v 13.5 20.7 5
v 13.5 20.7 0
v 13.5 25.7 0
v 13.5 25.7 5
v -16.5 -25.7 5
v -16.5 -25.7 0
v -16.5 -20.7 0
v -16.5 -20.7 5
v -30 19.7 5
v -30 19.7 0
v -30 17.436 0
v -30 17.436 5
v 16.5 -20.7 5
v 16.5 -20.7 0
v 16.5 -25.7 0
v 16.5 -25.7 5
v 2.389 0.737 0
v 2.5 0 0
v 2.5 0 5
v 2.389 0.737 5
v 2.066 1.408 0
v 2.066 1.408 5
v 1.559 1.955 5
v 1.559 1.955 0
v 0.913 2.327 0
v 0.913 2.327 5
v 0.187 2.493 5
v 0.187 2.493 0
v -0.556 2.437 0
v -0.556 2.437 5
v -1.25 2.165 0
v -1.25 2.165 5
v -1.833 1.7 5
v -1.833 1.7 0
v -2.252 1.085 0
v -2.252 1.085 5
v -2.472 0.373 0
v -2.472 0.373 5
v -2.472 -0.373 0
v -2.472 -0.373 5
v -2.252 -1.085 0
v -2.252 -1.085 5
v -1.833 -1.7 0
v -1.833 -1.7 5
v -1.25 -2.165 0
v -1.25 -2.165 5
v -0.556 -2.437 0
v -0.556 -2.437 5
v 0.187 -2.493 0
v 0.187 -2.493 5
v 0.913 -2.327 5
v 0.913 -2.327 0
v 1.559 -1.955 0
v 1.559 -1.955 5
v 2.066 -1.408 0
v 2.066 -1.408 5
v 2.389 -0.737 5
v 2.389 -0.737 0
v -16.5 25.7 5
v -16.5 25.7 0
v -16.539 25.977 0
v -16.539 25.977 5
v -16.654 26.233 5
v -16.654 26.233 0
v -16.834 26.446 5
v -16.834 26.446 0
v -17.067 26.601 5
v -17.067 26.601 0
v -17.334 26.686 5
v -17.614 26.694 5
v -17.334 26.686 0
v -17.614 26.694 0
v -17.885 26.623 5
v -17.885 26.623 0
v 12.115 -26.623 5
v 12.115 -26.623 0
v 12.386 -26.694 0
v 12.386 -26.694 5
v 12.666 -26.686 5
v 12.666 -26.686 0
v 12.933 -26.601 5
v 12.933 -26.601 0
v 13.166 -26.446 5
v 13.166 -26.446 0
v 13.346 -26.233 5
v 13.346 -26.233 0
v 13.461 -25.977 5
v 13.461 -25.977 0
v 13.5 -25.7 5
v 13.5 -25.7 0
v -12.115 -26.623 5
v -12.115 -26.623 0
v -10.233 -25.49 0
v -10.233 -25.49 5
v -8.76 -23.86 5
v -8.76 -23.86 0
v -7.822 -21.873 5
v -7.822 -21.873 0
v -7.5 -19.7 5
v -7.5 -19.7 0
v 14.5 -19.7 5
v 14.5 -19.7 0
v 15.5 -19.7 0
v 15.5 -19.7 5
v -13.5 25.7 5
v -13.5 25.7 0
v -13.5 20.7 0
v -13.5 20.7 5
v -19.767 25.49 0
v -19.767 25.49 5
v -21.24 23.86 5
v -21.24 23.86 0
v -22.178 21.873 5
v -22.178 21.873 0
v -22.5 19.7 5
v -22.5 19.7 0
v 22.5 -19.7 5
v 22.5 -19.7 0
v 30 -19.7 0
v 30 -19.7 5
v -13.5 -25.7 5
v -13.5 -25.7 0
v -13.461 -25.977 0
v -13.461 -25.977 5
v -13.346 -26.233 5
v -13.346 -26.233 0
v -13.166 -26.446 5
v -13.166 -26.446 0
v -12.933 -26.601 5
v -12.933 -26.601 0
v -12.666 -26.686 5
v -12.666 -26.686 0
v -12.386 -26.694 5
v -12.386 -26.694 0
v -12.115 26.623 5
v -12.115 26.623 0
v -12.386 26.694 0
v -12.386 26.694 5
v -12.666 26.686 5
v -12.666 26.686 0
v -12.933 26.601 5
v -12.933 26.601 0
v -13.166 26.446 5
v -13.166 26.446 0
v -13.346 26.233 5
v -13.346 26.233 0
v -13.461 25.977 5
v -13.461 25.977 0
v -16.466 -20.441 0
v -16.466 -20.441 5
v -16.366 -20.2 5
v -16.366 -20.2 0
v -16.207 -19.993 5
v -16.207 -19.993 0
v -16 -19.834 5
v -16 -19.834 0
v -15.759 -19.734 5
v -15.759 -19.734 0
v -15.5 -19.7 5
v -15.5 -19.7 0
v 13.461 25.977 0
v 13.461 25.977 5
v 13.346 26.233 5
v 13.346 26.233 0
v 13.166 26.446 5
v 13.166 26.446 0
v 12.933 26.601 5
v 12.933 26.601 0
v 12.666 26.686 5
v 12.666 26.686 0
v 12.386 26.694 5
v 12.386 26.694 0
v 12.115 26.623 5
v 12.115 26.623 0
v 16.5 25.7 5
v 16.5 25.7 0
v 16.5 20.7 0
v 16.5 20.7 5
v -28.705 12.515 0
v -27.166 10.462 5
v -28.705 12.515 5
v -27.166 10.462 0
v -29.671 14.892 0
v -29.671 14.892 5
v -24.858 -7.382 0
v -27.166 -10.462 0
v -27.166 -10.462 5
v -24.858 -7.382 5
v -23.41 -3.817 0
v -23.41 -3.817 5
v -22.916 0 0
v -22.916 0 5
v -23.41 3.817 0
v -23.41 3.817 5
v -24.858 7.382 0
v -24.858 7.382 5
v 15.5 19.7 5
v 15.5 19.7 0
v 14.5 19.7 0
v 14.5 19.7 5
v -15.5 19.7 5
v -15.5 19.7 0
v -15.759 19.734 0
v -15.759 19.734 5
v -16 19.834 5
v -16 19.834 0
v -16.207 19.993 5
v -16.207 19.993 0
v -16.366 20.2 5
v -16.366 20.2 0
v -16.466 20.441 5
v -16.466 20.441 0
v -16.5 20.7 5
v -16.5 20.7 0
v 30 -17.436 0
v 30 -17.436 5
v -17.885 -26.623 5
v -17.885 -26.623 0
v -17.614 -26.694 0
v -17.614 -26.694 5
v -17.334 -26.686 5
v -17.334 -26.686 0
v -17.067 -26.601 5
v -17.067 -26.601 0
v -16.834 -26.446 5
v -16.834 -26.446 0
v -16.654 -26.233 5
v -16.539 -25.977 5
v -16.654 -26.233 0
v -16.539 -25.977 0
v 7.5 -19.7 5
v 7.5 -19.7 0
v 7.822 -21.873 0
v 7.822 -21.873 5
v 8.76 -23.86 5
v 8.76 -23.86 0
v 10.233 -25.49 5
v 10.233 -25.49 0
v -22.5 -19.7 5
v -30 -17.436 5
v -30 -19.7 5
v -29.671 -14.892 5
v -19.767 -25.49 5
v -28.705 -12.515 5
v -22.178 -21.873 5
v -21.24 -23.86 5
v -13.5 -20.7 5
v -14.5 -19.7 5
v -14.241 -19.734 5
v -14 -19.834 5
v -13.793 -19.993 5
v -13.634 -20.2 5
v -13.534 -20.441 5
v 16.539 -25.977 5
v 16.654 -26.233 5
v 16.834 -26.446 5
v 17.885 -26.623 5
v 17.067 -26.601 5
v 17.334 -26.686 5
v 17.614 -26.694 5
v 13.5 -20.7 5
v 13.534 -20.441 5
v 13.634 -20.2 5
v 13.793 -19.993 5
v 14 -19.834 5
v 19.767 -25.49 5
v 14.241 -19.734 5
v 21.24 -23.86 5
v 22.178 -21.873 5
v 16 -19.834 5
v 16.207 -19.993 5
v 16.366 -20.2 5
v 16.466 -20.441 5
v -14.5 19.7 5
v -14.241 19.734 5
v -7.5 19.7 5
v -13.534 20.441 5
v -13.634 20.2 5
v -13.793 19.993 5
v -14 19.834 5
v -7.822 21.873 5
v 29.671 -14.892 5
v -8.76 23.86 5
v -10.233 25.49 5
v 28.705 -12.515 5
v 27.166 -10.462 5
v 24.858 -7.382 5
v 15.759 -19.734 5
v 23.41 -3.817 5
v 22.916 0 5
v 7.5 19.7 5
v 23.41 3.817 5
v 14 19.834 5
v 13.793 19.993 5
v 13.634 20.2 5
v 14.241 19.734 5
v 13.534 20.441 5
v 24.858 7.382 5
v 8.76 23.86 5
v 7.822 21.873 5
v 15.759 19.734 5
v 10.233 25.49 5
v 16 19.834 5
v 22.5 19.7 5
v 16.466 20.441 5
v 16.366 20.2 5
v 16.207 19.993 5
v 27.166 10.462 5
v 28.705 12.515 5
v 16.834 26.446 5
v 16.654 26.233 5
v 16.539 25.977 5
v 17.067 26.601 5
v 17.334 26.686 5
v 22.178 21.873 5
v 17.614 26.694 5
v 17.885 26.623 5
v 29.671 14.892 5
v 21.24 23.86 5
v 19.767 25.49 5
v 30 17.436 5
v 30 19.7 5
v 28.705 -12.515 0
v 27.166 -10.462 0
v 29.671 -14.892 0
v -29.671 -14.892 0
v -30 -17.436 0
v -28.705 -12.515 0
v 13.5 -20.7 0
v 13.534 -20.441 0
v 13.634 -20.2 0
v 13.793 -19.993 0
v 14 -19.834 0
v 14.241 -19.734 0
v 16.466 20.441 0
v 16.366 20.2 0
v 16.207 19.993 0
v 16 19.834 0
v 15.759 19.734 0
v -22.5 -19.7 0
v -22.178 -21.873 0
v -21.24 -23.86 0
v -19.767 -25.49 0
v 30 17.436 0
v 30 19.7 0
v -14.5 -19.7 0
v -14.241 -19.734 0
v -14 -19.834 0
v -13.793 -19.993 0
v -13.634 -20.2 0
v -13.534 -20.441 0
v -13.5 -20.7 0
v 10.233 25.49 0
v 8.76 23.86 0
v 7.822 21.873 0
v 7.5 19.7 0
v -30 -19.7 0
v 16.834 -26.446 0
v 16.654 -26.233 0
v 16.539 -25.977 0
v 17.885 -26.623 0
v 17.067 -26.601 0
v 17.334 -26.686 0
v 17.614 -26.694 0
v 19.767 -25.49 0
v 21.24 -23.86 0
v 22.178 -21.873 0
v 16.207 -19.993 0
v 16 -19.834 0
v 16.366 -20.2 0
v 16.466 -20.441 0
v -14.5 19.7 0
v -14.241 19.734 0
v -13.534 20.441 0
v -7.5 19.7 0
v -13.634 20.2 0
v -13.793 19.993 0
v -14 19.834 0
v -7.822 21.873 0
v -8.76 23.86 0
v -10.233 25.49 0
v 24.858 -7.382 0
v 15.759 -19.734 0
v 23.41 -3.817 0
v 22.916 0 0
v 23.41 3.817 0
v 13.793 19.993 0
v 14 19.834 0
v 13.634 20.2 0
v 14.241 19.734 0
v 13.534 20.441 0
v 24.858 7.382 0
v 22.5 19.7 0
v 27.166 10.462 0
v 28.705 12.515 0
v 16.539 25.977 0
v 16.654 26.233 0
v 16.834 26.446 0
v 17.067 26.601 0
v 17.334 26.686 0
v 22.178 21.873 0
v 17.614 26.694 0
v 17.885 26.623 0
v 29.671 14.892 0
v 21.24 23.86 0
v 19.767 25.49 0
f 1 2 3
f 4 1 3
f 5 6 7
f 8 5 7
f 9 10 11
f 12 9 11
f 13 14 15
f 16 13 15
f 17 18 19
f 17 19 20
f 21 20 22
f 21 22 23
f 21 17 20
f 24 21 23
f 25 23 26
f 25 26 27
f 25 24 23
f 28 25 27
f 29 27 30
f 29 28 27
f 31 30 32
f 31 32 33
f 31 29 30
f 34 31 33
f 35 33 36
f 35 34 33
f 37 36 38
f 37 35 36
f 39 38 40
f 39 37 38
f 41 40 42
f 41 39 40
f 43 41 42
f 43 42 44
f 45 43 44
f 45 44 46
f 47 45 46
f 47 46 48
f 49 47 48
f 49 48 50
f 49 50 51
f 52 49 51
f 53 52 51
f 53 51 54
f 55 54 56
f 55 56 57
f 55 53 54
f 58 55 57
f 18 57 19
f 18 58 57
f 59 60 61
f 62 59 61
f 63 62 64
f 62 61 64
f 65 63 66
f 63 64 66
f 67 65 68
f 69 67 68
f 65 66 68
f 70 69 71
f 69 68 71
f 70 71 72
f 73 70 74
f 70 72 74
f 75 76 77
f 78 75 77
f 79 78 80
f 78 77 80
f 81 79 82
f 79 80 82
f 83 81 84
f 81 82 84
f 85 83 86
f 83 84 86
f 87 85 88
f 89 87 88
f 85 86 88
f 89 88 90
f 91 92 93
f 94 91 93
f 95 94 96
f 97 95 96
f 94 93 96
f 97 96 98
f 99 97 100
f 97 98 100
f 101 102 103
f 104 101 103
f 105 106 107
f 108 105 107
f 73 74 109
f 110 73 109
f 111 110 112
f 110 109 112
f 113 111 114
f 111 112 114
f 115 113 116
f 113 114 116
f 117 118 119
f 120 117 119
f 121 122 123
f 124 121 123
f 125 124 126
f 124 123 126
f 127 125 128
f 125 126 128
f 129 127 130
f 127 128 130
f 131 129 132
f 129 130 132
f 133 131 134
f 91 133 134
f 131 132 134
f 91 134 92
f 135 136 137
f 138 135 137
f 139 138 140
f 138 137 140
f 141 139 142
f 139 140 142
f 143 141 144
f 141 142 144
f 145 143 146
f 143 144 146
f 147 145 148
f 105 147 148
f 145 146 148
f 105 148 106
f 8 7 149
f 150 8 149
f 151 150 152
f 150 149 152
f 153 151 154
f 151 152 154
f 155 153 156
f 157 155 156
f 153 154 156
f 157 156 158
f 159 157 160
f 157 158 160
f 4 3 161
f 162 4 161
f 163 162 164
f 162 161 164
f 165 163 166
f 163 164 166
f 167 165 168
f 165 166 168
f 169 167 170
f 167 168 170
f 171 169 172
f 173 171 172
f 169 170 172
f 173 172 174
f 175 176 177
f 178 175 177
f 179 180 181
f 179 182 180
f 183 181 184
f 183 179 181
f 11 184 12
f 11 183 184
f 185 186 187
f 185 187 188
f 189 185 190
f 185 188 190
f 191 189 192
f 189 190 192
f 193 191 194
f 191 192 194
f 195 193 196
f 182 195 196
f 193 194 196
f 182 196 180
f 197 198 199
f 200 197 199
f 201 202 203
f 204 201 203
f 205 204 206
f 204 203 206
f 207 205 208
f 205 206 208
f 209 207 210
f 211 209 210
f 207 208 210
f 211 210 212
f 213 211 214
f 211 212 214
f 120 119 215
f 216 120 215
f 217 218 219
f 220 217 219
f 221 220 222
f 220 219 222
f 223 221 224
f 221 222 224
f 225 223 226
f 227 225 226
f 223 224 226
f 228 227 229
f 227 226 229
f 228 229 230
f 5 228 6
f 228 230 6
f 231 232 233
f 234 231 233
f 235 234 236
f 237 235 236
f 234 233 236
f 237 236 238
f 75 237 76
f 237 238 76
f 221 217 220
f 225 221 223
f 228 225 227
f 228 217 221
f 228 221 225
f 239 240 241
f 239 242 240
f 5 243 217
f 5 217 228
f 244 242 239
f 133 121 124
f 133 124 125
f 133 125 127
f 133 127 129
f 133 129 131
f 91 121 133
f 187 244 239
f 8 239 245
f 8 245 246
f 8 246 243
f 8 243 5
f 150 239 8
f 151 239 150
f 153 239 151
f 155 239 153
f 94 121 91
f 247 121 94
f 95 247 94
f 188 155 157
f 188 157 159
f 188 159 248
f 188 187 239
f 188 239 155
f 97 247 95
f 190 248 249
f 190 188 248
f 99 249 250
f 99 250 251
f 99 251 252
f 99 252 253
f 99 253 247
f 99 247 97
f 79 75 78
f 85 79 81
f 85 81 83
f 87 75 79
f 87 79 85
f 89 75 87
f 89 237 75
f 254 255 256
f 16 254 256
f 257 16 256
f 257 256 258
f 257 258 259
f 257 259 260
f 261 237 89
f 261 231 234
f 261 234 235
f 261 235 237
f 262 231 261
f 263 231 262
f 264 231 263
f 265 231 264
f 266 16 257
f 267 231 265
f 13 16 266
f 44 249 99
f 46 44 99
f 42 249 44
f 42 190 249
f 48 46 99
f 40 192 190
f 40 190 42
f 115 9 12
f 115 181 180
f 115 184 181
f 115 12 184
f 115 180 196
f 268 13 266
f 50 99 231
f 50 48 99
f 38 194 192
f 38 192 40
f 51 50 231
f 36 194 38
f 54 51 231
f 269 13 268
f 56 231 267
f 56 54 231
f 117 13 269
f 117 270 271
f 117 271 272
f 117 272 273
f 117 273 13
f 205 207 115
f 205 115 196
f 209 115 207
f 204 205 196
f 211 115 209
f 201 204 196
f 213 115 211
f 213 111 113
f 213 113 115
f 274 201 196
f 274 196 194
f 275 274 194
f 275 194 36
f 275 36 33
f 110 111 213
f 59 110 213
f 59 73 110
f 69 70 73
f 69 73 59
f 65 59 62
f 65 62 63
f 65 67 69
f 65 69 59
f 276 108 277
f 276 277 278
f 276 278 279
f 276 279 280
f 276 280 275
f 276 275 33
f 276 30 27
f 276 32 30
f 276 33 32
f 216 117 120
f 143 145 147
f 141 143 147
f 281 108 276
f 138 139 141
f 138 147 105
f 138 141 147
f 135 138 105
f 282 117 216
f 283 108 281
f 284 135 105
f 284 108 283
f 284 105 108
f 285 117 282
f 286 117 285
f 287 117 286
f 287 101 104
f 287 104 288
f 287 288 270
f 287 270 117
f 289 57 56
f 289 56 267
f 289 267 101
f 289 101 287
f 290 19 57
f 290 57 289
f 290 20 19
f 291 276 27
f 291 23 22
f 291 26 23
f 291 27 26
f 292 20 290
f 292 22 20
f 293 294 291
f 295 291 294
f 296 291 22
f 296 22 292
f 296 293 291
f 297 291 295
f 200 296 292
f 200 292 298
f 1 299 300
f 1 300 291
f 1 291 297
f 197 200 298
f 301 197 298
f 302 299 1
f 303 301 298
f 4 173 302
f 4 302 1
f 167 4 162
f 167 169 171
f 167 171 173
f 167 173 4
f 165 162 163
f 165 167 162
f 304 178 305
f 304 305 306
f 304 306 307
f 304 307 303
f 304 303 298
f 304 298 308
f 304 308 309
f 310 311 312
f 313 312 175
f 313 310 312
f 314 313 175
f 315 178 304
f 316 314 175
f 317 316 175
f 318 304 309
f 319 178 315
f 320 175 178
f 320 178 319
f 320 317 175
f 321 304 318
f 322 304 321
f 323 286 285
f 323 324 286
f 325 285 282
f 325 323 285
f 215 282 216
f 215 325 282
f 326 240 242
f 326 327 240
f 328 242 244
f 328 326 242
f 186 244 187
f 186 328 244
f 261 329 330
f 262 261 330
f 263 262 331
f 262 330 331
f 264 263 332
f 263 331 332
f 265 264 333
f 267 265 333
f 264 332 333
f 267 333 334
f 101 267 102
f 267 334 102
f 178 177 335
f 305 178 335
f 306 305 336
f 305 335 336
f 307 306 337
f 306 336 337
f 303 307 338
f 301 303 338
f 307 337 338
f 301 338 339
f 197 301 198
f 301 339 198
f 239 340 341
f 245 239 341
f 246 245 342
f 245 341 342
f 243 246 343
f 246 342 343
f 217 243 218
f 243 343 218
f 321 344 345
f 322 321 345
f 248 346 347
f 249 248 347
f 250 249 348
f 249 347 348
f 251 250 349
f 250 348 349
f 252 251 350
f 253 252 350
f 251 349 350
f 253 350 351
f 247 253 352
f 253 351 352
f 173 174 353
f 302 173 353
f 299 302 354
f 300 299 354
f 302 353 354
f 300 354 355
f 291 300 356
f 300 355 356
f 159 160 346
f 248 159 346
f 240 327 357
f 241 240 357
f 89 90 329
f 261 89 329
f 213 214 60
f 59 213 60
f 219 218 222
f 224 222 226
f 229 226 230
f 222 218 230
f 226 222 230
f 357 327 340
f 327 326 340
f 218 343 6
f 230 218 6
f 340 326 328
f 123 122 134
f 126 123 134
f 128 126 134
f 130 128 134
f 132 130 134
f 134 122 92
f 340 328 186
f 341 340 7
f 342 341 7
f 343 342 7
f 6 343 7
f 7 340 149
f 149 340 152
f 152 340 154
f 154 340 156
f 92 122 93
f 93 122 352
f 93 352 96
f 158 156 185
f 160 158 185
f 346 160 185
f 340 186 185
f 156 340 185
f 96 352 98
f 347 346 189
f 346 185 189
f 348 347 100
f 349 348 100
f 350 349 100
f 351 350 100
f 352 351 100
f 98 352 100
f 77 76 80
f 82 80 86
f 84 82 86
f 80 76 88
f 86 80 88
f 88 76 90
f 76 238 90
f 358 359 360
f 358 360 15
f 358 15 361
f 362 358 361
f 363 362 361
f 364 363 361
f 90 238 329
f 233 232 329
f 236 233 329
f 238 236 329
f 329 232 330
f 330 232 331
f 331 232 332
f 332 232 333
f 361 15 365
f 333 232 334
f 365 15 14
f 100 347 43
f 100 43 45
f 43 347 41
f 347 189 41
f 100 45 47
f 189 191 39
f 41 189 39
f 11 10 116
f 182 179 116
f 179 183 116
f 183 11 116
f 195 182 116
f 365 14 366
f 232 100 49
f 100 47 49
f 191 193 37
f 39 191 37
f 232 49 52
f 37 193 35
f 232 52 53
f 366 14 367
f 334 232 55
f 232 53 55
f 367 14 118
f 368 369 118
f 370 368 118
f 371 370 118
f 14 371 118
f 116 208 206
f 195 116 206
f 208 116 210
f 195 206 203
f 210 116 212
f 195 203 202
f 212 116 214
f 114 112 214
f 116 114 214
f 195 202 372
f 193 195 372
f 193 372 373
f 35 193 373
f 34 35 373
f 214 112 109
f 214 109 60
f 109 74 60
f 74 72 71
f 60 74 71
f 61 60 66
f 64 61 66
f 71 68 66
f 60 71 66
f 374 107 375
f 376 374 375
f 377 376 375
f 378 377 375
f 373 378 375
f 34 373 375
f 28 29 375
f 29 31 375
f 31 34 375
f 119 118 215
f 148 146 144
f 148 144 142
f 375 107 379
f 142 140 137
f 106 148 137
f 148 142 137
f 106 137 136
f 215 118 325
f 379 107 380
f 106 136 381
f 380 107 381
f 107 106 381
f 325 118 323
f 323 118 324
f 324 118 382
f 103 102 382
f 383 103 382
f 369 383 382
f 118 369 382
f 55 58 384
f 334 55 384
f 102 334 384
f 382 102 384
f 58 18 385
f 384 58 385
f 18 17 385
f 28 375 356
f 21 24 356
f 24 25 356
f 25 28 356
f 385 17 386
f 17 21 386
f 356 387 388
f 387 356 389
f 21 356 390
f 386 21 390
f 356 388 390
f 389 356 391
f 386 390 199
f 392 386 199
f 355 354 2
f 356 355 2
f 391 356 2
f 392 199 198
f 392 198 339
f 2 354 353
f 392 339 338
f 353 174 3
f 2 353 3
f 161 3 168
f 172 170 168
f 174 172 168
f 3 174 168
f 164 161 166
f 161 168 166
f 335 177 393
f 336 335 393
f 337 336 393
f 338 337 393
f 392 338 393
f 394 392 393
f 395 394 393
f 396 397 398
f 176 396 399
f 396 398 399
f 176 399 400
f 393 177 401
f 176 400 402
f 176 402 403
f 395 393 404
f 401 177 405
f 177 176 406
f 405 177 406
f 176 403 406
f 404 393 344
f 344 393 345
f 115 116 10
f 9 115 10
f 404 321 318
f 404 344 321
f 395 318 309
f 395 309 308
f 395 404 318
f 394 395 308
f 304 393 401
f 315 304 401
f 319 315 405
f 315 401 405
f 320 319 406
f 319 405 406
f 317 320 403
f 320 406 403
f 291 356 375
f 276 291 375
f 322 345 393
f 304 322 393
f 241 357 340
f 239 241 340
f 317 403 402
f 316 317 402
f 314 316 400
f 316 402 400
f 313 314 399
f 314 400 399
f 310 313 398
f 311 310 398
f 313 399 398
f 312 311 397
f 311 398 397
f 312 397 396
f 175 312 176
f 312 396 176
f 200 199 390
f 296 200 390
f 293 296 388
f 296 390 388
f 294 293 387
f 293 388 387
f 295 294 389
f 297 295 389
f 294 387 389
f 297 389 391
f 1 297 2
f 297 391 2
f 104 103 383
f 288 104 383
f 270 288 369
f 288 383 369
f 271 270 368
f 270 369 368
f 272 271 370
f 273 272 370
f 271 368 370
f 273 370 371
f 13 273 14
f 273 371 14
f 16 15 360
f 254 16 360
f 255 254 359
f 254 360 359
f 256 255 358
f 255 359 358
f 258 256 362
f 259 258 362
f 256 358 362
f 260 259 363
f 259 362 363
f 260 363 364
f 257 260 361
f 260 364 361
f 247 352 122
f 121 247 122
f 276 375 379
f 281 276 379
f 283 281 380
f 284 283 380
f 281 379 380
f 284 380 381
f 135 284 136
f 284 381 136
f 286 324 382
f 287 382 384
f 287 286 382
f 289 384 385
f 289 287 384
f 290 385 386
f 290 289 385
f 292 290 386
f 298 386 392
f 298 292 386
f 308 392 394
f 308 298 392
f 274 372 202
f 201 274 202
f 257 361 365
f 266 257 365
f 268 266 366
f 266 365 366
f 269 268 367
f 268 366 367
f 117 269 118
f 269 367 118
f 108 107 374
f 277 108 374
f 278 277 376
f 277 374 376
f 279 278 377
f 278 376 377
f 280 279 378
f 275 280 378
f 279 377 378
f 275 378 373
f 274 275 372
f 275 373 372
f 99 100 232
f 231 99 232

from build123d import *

# Parameters (mm, degrees)
ESQUISSE1_R             = 2.5
BOSS_EXTRU_1_DEPTH      = 5
ENL_V_MAT_EXTRU_1_DEPTH = 41.47085371
CONG_1_R                = 10


with BuildPart() as part:
    # Esquisse1 → Boss.-Extru.1 (new body)
    with BuildSketch(Plane.XY):
        with BuildLine():
            Line((-7.5, -19.7), (7.5, -19.7))
            ThreePointArc((7.5, -19.7), (8.759622792, -23.860251472), (12.115384615, -26.623076923))
            ThreePointArc((12.115384615, -26.623076923), (13.054700196, -26.532050294), (13.5, -25.7))
            Line((13.5, -25.7), (13.5, -20.7))
            ThreePointArc((13.5, -20.7), (13.792893219, -19.992893219), (14.5, -19.7))
            Line((14.5, -19.7), (15.5, -19.7))
            ThreePointArc((15.5, -19.7), (16.207106781, -19.992893219), (16.5, -20.7))
            Line((16.5, -20.7), (16.5, -25.7))
            ThreePointArc((16.5, -25.7), (16.945299804, -26.532050294), (17.884615385, -26.623076923))
            ThreePointArc((17.884615385, -26.623076923), (21.240377208, -23.860251472), (22.5, -19.7))
            Line((22.5, -19.7), (30, -19.7))
            Line((30, -19.7), (30, 19.7))
            Line((30, 19.7), (22.5, 19.7))
            ThreePointArc((22.5, 19.7), (21.240377208, 23.860251472), (17.884615385, 26.623076923))
            ThreePointArc((17.884615385, 26.623076923), (16.945299804, 26.532050294), (16.5, 25.7))
            Line((16.5, 25.7), (16.5, 20.7))
            ThreePointArc((16.5, 20.7), (16.207106781, 19.992893219), (15.5, 19.7))
            Line((15.5, 19.7), (14.5, 19.7))
            ThreePointArc((14.5, 19.7), (13.792893219, 19.992893219), (13.5, 20.7))
            Line((13.5, 20.7), (13.5, 25.7))
            ThreePointArc((13.5, 25.7), (13.054700196, 26.532050294), (12.115384615, 26.623076923))
            ThreePointArc((12.115384615, 26.623076923), (8.759622792, 23.860251472), (7.5, 19.7))
            Line((7.5, 19.7), (-7.5, 19.7))
            ThreePointArc((-7.5, 19.7), (-8.759622792, 23.860251472), (-12.115384615, 26.623076923))
            ThreePointArc((-12.115384615, 26.623076923), (-13.054700196, 26.532050294), (-13.5, 25.7))
            Line((-13.5, 25.7), (-13.5, 20.7))
            ThreePointArc((-13.5, 20.7), (-13.792893219, 19.992893219), (-14.5, 19.7))
            Line((-14.5, 19.7), (-15.5, 19.7))
            ThreePointArc((-15.5, 19.7), (-16.207106781, 19.992893219), (-16.5, 20.7))
            Line((-16.5, 20.7), (-16.5, 25.7))
            ThreePointArc((-16.5, 25.7), (-16.945299804, 26.532050294), (-17.884615385, 26.623076923))
            ThreePointArc((-17.884615385, 26.623076923), (-21.240377208, 23.860251472), (-22.5, 19.7))
            Line((-22.5, 19.7), (-30, 19.7))
            Line((-30, 19.7), (-30, -19.7))
            Line((-30, -19.7), (-22.5, -19.7))
            ThreePointArc((-22.5, -19.7), (-21.240377208, -23.860251472), (-17.884615385, -26.623076923))
            ThreePointArc((-17.884615385, -26.623076923), (-16.945299804, -26.532050294), (-16.5, -25.7))
            Line((-16.5, -25.7), (-16.5, -20.7))
            ThreePointArc((-16.5, -20.7), (-16.207106781, -19.992893219), (-15.5, -19.7))
            Line((-15.5, -19.7), (-14.5, -19.7))
            ThreePointArc((-14.5, -19.7), (-13.792893219, -19.992893219), (-13.5, -20.7))
            Line((-13.5, -20.7), (-13.5, -25.7))
            ThreePointArc((-13.5, -25.7), (-13.054700196, -26.532050294), (-12.115384615, -26.623076923))
            ThreePointArc((-12.115384615, -26.623076923), (-8.759622792, -23.860251472), (-7.5, -19.7))
        make_face()
        Circle(ESQUISSE1_R, mode=Mode.SUBTRACT)
    extrude(amount=BOSS_EXTRU_1_DEPTH)

    # Esquisse2 → Enlèv. mat.-Extru.1 (cut, through all)
    with BuildSketch(Plane.XY.offset(5)):
        with BuildLine():
            Line((-30, 12.741190179), (-30, -12.741190179))
            ThreePointArc((-30, -12.741190179), (-22.915937899, 0), (-30, 12.741190179))
        make_face()
        with BuildLine():
            Line((30, 12.741190179), (30, -12.741190179))
            ThreePointArc((30, -12.741190179), (22.915937899, 0), (30, 12.741190179))
        make_face()
    extrude(amount=-ENL_V_MAT_EXTRU_1_DEPTH, mode=Mode.SUBTRACT)

    # Congé1
    cong_1_edges = [part.edges().sort_by_distance(p)[0] for p in [
        (-30, 12.741190179, 2.5),
        (-30, -12.741190179, 2.5),
        (30, -12.741190179, 2.5),
        (30, 12.741190179, 2.5),
    ]]
    fillet(cong_1_edges, radius=CONG_1_R)


solid = part.part
